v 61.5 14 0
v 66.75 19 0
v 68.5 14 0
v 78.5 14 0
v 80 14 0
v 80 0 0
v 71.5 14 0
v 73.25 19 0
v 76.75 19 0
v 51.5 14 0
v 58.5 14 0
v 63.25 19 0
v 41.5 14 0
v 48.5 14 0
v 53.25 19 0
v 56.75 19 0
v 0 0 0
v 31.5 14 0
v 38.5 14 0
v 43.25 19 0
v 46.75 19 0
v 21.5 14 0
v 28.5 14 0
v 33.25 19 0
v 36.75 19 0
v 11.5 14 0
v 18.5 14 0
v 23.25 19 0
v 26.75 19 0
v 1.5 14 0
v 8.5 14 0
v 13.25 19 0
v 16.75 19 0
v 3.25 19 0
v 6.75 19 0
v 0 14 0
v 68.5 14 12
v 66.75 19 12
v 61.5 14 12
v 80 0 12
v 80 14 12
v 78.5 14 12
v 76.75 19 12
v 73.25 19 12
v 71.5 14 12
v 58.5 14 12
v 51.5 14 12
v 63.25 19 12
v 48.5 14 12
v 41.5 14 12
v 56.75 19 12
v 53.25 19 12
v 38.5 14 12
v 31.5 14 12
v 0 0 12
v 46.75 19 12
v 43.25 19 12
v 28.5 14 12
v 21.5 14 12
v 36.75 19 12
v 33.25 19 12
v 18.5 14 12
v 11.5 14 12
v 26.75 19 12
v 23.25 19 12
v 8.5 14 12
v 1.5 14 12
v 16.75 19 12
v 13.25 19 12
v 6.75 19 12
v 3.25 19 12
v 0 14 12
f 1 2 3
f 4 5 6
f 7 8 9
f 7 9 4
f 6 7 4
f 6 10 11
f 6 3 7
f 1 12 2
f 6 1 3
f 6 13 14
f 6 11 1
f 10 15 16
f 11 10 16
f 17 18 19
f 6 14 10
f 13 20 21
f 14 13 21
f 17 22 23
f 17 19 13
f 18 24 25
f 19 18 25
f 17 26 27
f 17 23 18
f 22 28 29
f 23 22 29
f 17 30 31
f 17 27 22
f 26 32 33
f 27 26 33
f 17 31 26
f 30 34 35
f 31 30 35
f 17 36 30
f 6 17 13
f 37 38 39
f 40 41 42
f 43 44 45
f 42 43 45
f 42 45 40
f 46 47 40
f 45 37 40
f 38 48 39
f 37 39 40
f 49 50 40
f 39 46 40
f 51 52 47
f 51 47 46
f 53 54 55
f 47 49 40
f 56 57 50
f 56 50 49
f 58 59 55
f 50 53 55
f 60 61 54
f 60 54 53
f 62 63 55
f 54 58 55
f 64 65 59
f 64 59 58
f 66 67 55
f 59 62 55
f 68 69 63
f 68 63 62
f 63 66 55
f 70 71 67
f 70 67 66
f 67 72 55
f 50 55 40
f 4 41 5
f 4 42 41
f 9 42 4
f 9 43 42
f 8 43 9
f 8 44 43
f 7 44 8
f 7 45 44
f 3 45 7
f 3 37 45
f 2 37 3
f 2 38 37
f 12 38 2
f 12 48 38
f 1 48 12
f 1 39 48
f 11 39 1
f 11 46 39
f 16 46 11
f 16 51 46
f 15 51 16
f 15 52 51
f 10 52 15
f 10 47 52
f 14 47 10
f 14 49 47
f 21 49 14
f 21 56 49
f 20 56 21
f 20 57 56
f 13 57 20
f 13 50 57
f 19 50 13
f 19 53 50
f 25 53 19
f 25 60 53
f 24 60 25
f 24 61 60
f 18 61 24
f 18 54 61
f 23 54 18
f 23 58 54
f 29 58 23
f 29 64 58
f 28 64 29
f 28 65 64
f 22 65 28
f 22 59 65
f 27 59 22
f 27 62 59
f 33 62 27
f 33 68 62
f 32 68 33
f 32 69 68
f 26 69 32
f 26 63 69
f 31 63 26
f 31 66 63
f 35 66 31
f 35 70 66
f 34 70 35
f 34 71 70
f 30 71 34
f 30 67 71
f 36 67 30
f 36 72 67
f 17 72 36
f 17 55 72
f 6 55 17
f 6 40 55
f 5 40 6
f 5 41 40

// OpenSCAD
$fn = 32;

// ----------------------------------------------------------------------
// Gear rack: 8 teeth, pitch 10 mm
// ----------------------------------------------------------------------

// --- parameters (mm) ---
teeth = 8;                // number of teeth
pitch = 10;               // tooth pitch, X
root_w = 7;               // tooth width at the root
tip_w = 3.5;              // tooth width at the tip
base_h = 14;              // rack body height, Y
tooth_h = 5;              // tooth height above the body
plate_t = 12;             // rack width, Z (extrusion height)

rack_l = teeth * pitch;  // overall length
total_h = base_h + tooth_h;  // overall height

profile = [[0, 0], [80, 0], [80, 14], [78.5, 14], [76.75, 19], [73.25, 19], [71.5, 14], [68.5, 14], [66.75, 19], [63.25, 19], [61.5, 14], [58.5, 14], [56.75, 19], [53.25, 19], [51.5, 14], [48.5, 14], [46.75, 19], [43.25, 19], [41.5, 14], [38.5, 14], [36.75, 19], [33.25, 19], [31.5, 14], [28.5, 14], [26.75, 19], [23.25, 19], [21.5, 14], [18.5, 14], [16.75, 19], [13.25, 19], [11.5, 14], [8.5, 14], [6.75, 19], [3.25, 19], [1.5, 14], [0, 14]];  // primary outline, 36 points, counter clockwise

// --- the one profile operation ---
linear_extrude(height = plate_t) polygon(points = profile);
